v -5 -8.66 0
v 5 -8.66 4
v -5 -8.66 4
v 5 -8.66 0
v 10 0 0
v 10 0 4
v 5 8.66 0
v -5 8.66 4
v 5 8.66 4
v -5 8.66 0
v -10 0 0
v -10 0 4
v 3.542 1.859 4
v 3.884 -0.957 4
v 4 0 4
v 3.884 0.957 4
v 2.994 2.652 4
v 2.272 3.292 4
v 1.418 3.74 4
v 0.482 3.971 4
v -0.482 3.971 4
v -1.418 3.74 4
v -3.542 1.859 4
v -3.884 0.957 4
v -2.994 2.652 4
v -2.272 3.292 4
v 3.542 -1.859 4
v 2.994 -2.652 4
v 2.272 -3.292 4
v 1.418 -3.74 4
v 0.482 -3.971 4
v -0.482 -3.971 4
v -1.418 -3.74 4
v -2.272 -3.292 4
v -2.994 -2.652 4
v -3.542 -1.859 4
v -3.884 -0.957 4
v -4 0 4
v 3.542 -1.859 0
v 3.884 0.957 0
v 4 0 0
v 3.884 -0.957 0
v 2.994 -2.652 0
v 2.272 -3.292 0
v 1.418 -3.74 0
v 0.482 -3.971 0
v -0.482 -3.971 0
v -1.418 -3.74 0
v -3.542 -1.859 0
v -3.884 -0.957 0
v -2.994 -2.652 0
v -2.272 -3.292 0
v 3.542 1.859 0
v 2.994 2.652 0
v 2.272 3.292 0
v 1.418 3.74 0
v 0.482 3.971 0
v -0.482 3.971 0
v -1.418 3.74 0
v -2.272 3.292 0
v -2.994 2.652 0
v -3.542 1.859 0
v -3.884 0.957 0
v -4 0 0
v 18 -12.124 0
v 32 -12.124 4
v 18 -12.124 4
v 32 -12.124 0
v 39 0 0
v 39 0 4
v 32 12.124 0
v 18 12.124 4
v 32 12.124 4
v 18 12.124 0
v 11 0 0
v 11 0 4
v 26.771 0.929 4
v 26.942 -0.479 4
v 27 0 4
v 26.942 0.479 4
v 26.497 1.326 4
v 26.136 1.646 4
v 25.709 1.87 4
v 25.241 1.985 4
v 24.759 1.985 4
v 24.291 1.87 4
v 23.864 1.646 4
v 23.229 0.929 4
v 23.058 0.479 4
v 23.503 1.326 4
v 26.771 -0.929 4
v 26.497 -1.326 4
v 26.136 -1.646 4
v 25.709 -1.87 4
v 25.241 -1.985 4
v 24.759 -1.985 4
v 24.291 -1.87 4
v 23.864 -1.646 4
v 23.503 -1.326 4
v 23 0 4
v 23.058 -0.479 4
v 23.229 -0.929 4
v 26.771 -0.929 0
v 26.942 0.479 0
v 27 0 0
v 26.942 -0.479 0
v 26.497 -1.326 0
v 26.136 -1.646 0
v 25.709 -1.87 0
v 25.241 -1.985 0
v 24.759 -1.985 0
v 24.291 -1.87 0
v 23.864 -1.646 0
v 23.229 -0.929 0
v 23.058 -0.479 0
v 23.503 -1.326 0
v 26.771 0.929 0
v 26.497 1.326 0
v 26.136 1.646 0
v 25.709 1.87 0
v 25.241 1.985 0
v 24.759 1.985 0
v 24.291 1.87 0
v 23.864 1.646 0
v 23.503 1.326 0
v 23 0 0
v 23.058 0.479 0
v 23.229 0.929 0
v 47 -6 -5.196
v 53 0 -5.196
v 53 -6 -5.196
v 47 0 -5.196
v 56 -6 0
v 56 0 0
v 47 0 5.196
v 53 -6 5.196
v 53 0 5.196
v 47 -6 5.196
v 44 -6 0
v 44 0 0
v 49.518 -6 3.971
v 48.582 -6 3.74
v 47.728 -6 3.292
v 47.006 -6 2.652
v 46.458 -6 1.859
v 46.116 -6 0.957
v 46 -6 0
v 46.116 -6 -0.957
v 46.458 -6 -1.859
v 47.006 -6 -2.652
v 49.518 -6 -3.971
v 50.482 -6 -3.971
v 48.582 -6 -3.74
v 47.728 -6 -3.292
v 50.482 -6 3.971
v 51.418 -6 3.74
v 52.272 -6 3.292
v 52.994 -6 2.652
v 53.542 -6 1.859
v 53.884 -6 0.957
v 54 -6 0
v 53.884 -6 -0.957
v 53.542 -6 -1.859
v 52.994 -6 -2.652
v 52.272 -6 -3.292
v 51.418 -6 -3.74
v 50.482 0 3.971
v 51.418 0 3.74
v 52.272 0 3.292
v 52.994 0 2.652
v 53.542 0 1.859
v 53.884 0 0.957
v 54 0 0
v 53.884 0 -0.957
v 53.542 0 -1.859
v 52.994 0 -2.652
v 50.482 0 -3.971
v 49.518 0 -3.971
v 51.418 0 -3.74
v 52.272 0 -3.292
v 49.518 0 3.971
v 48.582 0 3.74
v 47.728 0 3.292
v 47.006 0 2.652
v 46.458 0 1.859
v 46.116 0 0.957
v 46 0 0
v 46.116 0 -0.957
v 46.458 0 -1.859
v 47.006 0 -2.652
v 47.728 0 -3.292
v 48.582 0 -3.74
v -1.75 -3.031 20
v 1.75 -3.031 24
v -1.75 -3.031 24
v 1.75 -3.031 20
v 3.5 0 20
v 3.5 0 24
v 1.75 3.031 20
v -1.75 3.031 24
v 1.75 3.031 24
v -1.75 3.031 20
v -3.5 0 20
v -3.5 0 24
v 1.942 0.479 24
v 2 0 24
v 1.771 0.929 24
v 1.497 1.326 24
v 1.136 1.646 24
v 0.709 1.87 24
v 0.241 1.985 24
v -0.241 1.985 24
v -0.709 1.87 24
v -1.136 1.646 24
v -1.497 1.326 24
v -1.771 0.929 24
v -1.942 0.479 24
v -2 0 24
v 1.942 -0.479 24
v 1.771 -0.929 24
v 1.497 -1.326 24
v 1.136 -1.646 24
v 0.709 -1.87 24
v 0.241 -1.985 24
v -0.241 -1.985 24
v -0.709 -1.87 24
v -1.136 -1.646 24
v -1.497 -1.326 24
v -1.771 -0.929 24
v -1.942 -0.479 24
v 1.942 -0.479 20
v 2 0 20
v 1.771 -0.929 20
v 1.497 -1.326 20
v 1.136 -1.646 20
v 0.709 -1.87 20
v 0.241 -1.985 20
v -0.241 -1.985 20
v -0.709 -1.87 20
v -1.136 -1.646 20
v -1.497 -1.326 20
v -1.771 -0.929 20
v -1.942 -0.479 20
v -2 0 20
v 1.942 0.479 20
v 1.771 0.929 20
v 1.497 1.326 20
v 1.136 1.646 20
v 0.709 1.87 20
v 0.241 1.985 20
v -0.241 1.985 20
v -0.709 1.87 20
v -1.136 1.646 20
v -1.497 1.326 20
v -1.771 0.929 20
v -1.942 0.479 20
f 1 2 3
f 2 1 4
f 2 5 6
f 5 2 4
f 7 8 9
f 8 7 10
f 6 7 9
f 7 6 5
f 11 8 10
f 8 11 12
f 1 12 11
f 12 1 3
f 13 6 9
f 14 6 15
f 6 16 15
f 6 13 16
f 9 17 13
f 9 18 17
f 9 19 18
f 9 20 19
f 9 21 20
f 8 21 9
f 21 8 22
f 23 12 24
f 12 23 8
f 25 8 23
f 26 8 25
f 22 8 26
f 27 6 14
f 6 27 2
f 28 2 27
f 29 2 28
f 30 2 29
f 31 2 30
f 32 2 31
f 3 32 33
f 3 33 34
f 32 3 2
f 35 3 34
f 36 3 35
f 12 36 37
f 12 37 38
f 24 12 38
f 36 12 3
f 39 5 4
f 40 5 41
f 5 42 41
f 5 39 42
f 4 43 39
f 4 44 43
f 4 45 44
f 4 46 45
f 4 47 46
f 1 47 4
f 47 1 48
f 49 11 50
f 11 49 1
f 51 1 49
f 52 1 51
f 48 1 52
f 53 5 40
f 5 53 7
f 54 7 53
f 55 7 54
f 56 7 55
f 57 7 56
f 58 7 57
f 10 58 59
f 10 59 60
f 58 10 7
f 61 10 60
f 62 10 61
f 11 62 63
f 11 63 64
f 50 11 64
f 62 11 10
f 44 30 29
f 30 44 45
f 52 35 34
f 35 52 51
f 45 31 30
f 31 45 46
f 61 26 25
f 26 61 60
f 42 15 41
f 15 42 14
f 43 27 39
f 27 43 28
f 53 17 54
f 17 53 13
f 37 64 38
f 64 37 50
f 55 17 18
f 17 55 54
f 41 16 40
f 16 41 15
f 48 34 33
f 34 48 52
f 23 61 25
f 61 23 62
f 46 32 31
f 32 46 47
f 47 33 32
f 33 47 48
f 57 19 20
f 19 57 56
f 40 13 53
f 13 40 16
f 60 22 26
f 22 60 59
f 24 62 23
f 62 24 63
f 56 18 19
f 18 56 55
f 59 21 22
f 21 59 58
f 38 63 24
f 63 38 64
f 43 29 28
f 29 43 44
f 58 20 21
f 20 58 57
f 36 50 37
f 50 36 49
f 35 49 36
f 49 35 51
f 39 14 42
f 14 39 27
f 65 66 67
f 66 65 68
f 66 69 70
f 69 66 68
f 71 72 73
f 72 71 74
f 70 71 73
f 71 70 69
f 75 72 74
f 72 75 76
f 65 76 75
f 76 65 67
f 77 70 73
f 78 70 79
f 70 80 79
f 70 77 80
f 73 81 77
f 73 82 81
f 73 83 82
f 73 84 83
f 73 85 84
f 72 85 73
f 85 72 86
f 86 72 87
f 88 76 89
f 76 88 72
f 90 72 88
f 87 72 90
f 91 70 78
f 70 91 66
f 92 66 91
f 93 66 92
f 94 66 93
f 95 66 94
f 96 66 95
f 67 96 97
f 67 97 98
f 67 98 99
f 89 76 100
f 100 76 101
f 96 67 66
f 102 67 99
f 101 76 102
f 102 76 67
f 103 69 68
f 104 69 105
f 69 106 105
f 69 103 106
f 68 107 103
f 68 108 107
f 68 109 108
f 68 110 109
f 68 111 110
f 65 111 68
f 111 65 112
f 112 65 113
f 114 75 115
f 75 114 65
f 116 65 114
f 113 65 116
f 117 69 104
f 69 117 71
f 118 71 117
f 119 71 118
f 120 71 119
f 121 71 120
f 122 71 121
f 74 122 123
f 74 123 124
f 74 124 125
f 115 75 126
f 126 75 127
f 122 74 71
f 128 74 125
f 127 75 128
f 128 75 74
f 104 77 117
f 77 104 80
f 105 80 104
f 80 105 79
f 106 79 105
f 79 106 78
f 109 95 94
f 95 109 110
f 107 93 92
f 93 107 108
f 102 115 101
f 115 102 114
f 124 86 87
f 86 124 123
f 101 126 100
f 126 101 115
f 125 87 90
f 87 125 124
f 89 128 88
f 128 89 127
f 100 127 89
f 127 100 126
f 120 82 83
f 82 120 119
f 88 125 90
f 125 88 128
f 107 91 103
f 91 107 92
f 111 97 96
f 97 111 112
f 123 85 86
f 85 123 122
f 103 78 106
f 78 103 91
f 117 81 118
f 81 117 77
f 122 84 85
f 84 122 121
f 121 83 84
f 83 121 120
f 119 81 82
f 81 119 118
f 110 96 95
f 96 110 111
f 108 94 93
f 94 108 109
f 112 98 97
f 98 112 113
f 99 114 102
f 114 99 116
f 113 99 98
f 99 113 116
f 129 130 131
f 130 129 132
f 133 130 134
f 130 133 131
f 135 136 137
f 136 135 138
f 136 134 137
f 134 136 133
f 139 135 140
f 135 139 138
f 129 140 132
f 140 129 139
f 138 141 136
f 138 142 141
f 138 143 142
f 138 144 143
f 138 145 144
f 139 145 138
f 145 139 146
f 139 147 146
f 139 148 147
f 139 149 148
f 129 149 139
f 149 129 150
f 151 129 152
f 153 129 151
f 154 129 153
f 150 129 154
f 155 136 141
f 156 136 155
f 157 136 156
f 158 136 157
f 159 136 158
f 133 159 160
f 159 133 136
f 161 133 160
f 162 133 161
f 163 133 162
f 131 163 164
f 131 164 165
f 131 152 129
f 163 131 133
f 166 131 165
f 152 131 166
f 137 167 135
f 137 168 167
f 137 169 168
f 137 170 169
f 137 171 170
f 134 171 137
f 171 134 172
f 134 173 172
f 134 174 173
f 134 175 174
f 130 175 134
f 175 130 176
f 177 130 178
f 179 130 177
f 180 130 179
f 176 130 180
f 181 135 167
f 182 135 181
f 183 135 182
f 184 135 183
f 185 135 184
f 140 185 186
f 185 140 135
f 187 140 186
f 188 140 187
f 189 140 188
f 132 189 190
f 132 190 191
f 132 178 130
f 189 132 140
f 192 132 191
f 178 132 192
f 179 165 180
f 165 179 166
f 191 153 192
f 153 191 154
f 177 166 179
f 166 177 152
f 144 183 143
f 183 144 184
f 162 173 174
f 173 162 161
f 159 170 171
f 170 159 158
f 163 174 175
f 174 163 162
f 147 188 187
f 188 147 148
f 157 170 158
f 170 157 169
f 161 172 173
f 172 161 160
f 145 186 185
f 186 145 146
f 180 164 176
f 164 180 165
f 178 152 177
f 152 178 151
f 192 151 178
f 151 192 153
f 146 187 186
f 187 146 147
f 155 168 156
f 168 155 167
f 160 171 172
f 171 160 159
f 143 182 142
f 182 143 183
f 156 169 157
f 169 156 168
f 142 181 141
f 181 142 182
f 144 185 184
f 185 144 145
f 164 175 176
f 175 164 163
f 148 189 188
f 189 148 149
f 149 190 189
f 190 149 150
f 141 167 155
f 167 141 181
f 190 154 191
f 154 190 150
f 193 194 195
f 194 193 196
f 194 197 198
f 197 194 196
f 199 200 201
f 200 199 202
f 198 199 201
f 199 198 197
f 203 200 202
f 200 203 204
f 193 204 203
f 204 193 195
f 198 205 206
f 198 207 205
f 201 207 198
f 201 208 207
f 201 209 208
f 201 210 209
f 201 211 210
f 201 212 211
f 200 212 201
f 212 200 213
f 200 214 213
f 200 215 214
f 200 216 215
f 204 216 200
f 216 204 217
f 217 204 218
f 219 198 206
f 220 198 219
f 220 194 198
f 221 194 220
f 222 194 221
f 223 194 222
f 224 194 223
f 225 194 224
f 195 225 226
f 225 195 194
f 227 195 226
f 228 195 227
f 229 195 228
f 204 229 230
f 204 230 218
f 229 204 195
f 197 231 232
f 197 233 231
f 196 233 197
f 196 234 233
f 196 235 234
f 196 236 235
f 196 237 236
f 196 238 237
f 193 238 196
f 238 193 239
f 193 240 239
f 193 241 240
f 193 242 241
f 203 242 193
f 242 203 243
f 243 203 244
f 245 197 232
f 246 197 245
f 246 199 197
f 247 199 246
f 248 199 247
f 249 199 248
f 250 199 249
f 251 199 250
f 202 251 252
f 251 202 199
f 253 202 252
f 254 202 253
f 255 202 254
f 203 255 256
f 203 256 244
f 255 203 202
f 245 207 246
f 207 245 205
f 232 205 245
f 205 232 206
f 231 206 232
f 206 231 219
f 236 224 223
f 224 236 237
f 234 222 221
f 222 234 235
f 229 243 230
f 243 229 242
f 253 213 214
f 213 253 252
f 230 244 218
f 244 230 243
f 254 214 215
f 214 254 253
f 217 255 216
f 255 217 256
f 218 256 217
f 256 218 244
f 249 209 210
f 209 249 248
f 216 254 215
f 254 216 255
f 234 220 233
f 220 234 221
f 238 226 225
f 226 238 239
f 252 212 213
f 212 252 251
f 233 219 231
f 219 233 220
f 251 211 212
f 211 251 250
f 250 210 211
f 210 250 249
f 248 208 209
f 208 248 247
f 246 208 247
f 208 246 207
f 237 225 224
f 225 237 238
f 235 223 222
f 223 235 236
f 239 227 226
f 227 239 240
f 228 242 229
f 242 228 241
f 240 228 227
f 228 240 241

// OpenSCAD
module piulita(raza_exterior, raza_interior, grosime)
{
    difference(){
        cylinder(h = grosime, r = raza_exterior, $fn = 6);
    
        translate ([0, 0, -1]) cylinder(h = grosime + 2, r = raza_interior, $fn = 26);
    }
}
//-----------------------------------
module piulita_M4()

{
    piulita(3.5, 2, 4); 
   }

//------------------------
color ("red") piulita(10, 4, 4);
color ("yellow") translate ([25, 0, 0]) piulita(14, 2, 4);

color("blue") translate ([50, 0, 0]) rotate([90, 0, 0]) piulita(6, 4, 6);
   
   translate([ 0, 0, 20]) piulita_M4();
